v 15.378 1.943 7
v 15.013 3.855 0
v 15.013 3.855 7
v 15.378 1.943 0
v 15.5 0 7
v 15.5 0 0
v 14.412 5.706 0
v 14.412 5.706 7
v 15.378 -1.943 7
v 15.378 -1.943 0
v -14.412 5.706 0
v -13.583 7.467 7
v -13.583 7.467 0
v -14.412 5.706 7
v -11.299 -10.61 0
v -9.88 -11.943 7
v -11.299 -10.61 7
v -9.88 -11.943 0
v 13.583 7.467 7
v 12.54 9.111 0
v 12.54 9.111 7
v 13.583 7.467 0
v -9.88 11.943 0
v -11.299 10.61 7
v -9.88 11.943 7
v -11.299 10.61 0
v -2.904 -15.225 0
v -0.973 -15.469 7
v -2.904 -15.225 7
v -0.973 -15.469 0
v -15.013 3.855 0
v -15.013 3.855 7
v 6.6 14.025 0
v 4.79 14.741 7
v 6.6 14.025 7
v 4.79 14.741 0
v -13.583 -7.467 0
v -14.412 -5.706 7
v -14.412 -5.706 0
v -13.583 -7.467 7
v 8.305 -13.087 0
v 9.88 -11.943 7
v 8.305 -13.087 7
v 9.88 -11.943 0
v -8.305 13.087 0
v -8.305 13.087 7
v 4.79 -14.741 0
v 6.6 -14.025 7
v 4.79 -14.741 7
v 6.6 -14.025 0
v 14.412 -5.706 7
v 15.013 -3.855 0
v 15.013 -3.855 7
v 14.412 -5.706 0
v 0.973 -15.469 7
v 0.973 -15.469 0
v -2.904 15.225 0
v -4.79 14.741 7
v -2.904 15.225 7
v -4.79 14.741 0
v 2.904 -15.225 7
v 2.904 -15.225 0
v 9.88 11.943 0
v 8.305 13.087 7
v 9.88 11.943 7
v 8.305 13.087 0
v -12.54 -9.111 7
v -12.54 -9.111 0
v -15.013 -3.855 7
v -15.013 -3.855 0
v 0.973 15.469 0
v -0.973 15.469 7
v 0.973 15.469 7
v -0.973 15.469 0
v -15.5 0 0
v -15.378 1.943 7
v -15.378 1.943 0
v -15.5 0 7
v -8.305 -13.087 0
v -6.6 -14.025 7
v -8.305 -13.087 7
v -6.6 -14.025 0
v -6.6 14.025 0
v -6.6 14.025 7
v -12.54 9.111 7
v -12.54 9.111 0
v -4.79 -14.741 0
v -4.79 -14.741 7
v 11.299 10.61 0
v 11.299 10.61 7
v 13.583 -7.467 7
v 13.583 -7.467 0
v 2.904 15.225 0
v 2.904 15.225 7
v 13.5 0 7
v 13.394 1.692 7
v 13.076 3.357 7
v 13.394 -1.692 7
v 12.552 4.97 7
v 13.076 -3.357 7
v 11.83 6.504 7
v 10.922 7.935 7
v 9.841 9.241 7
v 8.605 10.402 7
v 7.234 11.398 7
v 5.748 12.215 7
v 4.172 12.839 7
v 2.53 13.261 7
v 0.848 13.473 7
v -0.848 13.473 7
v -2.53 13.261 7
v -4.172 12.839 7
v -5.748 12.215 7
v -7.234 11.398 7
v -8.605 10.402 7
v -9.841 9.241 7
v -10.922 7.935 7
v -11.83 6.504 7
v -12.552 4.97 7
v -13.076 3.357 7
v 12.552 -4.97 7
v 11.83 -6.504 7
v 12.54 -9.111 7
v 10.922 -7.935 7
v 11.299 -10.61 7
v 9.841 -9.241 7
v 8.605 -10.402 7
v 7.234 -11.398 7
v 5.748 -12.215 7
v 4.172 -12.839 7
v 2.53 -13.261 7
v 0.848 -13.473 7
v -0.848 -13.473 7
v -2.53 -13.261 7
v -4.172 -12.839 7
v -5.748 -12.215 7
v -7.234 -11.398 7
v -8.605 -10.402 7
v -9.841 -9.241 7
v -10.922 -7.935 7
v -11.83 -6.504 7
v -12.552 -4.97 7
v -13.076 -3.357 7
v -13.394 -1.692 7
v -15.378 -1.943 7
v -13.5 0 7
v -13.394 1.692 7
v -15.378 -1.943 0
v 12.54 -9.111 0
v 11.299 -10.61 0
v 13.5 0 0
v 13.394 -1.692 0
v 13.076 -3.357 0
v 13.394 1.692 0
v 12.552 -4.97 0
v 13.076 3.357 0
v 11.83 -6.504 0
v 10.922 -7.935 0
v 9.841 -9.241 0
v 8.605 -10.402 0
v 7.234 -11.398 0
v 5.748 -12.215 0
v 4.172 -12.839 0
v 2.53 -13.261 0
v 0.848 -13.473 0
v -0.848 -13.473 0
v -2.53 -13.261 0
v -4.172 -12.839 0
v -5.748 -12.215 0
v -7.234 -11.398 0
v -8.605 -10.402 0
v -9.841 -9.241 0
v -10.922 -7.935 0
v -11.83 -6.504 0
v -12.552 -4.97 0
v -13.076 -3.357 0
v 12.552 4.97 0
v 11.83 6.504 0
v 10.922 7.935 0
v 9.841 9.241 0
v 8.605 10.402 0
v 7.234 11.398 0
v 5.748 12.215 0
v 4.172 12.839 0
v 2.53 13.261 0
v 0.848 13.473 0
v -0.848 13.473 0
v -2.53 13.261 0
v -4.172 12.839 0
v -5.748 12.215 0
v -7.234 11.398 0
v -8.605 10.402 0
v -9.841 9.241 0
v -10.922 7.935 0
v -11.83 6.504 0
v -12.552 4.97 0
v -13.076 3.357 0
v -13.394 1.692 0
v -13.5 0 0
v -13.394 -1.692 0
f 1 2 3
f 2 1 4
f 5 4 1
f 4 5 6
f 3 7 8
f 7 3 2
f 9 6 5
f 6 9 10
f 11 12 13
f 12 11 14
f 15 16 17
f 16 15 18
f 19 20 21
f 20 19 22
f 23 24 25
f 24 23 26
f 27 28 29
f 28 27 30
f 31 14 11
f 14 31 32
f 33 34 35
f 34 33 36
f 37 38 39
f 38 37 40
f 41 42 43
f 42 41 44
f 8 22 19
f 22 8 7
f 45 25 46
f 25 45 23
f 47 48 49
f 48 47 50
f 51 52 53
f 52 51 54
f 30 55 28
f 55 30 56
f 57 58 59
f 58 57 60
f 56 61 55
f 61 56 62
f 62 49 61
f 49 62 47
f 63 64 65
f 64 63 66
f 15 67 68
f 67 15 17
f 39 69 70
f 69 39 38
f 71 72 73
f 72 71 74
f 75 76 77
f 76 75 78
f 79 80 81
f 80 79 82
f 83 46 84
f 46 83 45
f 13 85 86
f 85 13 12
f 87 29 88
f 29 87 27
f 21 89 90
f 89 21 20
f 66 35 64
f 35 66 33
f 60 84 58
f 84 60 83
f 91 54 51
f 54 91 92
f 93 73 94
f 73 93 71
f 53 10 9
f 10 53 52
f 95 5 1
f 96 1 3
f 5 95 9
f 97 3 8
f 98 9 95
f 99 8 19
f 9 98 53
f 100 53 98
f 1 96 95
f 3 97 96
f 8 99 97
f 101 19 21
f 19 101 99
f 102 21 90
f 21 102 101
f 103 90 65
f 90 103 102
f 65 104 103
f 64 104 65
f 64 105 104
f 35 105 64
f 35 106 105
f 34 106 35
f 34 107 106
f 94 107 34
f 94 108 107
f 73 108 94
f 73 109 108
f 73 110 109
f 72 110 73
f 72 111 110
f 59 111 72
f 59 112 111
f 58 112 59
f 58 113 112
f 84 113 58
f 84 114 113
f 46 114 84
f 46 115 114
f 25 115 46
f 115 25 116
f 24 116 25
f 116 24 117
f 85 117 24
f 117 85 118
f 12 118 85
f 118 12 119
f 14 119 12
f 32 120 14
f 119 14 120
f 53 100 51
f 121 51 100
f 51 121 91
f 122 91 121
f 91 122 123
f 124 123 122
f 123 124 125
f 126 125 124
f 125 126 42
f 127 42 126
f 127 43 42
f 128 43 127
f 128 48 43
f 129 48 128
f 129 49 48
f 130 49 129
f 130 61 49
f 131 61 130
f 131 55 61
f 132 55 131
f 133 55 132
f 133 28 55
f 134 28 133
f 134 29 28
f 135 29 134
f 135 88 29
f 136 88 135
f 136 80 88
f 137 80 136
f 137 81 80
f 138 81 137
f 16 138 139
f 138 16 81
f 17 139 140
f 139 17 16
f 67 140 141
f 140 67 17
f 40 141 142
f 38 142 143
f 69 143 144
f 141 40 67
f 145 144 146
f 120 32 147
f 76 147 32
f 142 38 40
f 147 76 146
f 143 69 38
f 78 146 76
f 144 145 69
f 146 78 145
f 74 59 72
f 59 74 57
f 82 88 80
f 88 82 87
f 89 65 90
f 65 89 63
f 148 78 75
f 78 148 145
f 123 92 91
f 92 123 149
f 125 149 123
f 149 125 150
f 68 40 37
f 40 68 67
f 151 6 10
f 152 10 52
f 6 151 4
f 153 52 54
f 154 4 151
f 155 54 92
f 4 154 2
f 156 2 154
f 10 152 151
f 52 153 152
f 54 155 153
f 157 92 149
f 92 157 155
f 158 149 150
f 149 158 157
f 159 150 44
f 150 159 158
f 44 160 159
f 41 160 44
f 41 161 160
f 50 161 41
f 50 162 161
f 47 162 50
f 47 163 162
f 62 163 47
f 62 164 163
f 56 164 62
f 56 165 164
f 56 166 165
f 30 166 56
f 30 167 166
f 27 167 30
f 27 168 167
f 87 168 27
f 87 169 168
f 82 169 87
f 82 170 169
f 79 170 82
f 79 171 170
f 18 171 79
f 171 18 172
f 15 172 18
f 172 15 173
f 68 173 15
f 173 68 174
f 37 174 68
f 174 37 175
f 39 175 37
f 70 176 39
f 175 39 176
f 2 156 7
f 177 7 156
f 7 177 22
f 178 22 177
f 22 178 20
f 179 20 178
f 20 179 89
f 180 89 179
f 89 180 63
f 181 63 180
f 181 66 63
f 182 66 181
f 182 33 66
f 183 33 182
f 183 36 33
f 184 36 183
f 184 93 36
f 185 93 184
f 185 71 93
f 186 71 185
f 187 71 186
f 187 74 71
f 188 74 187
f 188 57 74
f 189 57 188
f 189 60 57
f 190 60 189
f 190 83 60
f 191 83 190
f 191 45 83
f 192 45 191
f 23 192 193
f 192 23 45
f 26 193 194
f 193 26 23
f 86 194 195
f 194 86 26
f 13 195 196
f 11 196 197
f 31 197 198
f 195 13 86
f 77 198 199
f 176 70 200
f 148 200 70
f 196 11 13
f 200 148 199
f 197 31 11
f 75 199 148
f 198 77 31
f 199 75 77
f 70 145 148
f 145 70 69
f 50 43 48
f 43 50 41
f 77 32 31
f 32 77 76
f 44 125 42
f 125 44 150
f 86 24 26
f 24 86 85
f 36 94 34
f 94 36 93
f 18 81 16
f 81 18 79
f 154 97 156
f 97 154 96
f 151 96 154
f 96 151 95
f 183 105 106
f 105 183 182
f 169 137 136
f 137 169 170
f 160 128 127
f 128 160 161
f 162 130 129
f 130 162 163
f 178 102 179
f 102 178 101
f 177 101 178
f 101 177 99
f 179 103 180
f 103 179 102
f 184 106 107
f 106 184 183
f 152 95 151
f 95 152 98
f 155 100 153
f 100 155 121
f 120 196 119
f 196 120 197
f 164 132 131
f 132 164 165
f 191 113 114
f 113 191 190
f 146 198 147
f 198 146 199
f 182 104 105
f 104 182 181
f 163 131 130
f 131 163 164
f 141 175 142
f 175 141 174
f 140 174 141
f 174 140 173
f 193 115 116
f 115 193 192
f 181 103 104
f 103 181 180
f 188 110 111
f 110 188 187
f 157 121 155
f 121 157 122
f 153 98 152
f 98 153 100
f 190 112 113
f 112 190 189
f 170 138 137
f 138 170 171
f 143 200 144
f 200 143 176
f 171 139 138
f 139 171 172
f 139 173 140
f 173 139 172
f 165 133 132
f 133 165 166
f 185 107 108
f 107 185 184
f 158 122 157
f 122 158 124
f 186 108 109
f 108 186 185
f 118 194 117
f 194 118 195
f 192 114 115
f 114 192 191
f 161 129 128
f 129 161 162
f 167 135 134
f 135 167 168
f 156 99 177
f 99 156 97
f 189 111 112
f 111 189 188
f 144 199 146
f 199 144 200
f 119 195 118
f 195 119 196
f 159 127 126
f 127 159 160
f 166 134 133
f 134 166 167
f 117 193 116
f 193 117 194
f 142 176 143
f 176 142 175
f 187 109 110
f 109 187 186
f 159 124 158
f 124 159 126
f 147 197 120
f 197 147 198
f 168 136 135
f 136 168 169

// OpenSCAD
$fn = 50;

shell = 2;
innerRadius = 27/2;
outerRadius = innerRadius + shell;
height = 7;

difference() {
    cylinder(height, r=outerRadius);
    cylinder(height + 2, r=innerRadius);
}
